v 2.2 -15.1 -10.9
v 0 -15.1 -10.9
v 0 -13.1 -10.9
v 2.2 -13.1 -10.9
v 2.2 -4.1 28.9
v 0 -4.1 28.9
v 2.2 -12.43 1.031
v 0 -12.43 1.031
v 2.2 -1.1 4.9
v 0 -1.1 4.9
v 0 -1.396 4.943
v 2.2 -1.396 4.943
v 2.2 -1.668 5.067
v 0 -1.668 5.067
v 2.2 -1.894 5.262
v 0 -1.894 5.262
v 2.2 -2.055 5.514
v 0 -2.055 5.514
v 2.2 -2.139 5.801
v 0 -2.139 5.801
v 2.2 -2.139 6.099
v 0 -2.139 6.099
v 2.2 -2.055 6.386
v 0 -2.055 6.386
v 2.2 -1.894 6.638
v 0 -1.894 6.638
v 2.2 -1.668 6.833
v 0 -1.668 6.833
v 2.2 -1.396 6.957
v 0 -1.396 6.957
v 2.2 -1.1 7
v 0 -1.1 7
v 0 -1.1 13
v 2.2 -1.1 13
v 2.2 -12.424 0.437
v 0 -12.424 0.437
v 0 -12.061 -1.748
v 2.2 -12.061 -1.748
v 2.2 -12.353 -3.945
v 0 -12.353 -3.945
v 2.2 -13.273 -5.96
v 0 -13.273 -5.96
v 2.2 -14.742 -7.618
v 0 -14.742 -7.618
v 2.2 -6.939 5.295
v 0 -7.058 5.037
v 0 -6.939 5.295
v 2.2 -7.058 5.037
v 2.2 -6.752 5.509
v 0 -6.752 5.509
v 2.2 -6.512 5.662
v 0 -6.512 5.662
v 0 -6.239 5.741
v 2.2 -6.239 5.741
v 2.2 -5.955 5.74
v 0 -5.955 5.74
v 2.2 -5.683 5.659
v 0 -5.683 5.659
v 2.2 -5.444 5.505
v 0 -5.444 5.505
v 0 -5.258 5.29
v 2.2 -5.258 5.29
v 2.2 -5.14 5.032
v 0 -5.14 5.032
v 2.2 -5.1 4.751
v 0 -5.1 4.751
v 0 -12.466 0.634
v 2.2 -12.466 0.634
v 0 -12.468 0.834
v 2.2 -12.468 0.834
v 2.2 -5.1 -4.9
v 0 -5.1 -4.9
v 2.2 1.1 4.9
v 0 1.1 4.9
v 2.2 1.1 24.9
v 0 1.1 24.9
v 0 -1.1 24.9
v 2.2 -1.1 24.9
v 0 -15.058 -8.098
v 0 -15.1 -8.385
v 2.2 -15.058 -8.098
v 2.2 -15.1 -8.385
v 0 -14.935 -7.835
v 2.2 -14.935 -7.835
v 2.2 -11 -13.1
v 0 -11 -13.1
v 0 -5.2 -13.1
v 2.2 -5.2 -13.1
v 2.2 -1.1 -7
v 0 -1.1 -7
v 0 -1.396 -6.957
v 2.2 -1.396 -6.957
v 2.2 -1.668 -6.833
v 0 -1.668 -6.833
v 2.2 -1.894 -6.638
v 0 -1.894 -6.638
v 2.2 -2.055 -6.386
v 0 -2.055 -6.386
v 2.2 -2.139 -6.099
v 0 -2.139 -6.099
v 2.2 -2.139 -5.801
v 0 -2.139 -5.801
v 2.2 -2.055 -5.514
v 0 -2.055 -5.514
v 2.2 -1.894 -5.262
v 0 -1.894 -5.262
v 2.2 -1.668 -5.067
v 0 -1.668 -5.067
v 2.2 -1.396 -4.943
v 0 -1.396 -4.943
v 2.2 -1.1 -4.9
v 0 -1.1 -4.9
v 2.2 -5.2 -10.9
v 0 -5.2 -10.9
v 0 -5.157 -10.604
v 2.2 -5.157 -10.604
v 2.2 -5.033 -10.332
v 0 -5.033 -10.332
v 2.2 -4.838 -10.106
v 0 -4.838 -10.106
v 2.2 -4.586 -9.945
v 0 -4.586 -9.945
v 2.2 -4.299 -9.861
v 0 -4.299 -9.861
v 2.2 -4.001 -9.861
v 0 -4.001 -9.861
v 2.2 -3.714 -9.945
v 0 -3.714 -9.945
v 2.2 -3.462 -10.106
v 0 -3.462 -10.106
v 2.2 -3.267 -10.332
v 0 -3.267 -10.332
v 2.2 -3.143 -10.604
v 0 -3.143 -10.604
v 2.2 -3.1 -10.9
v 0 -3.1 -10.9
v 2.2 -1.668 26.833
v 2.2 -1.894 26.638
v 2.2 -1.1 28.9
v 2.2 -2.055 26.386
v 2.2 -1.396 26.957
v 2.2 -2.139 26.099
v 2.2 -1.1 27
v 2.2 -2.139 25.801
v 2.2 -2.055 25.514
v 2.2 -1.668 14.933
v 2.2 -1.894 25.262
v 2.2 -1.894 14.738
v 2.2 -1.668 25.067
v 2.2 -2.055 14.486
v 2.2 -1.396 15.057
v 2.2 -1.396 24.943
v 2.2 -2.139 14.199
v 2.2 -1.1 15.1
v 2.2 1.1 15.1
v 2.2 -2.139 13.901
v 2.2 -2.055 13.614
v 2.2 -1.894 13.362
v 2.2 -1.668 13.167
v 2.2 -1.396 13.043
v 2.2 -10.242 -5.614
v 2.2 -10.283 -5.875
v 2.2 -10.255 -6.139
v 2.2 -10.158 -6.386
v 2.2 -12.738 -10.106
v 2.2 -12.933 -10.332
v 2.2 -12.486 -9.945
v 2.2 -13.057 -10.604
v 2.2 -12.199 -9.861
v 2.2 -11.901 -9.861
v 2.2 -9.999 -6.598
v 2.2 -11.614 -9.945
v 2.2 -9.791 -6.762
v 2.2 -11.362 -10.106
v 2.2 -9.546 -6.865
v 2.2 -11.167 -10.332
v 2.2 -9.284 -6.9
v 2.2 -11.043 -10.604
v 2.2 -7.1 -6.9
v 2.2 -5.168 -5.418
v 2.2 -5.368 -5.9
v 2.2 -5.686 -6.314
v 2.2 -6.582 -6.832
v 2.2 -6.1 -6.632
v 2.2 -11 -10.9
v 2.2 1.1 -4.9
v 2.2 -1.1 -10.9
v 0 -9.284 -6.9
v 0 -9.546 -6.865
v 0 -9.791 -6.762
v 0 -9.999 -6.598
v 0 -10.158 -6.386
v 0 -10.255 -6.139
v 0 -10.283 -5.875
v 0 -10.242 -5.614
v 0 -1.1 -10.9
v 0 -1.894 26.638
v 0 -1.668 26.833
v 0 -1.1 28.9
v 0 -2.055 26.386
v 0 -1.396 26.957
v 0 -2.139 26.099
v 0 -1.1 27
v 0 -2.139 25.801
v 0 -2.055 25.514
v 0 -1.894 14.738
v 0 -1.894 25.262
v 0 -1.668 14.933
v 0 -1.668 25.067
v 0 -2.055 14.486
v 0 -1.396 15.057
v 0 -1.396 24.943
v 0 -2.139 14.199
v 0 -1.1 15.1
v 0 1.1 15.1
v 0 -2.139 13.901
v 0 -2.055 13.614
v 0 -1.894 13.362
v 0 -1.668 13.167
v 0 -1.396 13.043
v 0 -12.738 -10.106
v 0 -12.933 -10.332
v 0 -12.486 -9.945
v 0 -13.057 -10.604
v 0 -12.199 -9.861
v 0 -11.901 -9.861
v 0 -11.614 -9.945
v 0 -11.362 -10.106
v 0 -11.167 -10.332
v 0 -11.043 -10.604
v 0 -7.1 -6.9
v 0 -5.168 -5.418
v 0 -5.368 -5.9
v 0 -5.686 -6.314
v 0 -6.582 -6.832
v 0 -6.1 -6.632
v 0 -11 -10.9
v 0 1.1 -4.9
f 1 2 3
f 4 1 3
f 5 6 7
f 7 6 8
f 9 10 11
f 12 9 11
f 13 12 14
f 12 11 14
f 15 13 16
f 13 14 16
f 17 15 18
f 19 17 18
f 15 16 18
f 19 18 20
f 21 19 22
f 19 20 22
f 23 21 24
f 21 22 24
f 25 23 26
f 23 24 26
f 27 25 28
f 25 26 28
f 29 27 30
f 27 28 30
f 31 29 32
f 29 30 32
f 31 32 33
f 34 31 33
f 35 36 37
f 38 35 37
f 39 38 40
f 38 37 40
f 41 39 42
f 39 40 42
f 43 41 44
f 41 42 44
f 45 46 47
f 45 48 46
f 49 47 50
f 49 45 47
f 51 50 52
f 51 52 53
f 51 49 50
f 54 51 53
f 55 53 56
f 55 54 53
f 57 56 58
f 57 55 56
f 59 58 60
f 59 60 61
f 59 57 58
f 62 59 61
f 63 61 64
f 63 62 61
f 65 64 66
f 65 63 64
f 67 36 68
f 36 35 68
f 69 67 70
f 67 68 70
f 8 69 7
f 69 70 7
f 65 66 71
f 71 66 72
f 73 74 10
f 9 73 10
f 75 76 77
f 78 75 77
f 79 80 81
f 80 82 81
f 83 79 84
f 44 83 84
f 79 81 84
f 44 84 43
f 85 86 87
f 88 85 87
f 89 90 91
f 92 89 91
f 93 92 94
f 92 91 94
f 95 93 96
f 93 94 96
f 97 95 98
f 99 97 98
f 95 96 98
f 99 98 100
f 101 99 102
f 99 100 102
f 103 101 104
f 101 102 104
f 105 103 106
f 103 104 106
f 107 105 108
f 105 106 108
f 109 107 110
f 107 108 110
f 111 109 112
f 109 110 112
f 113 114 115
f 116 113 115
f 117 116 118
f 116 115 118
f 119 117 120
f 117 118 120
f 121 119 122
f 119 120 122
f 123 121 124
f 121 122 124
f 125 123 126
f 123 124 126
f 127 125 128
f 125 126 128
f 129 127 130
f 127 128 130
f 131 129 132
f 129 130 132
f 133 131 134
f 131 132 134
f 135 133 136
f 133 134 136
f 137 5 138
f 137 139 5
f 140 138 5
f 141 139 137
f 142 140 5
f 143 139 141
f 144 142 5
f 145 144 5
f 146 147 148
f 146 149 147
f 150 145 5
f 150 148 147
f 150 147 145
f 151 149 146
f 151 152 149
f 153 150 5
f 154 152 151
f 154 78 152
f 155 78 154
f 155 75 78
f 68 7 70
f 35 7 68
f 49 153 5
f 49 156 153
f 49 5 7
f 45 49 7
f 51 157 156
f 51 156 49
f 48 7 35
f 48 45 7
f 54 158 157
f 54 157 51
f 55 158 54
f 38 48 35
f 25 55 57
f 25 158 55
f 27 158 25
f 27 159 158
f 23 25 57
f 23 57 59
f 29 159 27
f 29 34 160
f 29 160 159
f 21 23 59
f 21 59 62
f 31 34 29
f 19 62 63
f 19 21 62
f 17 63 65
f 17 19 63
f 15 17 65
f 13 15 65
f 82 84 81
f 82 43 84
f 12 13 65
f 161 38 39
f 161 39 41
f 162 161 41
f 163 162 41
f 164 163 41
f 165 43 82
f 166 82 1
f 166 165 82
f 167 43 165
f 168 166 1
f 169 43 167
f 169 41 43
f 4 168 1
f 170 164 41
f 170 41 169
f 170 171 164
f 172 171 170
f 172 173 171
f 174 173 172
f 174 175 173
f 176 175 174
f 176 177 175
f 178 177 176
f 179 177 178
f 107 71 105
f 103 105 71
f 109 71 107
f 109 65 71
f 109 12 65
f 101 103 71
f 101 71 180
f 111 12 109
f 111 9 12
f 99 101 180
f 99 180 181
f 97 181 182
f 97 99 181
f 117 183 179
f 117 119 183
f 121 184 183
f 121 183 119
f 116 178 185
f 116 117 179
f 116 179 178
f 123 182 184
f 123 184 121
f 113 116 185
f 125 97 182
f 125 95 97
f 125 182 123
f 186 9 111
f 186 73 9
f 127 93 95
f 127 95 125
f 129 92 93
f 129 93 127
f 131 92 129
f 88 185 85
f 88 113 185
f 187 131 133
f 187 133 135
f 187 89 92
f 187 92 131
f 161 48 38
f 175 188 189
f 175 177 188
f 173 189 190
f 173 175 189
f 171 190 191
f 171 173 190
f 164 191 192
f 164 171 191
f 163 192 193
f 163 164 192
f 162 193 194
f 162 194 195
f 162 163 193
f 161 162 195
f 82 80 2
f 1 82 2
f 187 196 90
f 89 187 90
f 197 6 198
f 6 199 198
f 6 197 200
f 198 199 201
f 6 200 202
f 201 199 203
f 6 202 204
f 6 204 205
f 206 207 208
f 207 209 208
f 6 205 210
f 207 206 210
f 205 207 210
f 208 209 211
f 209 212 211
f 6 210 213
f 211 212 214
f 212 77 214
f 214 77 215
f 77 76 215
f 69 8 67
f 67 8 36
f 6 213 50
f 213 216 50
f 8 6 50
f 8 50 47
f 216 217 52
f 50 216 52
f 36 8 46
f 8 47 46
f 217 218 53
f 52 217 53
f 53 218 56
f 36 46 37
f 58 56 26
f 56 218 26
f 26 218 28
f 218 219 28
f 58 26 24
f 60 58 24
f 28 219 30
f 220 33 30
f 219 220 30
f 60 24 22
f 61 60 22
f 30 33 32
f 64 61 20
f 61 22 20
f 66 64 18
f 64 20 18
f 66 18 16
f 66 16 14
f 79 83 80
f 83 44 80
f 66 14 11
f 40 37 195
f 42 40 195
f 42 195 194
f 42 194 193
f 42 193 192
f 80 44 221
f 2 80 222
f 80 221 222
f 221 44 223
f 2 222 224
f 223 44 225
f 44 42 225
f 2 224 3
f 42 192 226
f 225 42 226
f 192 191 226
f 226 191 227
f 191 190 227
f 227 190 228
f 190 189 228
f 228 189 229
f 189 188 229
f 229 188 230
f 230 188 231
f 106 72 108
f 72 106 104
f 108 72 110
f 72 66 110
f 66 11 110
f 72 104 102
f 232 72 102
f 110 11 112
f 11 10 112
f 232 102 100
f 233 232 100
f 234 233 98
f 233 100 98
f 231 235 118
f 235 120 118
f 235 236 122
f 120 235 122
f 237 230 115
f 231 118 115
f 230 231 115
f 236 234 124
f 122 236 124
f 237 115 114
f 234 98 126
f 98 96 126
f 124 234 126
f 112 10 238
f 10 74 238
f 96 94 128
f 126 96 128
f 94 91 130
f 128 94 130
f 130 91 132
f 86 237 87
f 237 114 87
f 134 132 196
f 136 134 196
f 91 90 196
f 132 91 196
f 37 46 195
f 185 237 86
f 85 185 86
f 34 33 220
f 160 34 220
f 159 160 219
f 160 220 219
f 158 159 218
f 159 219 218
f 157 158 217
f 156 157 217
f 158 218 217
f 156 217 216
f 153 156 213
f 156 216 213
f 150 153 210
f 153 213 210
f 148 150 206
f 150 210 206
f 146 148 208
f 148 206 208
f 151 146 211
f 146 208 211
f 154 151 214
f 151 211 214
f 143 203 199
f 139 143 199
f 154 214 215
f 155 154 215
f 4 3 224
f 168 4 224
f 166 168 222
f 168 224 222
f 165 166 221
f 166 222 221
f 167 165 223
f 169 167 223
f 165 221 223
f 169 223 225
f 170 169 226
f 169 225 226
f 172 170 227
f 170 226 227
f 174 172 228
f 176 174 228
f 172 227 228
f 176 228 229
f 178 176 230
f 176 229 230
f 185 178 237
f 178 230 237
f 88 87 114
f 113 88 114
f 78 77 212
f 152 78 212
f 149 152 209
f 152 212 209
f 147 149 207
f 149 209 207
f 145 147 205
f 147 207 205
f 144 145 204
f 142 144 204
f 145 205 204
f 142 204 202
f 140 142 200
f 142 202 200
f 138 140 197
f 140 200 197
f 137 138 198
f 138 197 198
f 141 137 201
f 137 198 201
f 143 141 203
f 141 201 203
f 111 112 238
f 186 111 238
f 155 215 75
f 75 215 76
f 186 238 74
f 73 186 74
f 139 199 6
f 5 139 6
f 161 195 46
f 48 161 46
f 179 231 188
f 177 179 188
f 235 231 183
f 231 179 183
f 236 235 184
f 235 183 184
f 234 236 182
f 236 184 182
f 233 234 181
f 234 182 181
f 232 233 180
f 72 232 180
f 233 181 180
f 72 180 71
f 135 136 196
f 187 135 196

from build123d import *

# Parameters (mm, degrees)
EXTRUDE_1_DEPTH = 2.2
FILLET_1_R      = 2
FILLET_2_R      = 1


with BuildPart() as part:
    # 草图1 → 凸台-拉伸1 (new body)
    with BuildSketch(Plane(origin=(0, 0, 0), x_dir=(0, 0, -1), z_dir=(1, 0, 0))):
        with BuildLine():
            ThreePointArc((7, -1.1), (5.95, -2.15), (4.9, -1.1))
            Line((4.9, -1.1), (4.9, 1.1))
            Line((4.9, 1.1), (-4.9, 1.1))
            Line((-4.9, 1.1), (-4.9, -1.1))
            ThreePointArc((-4.9, -1.1), (-5.95, -2.15), (-7, -1.1))
            Line((-7, -1.1), (-13, -1.1))
            ThreePointArc((-13, -1.1), (-14.05, -2.15), (-15.1, -1.1))
            Line((-15.1, -1.1), (-15.1, 1.1))
            Line((-15.1, 1.1), (-24.9, 1.1))
            Line((-24.9, 1.1), (-24.9, -1.1))
            ThreePointArc((-24.9, -1.1), (-25.95, -2.15), (-27, -1.1))
            Line((-27, -1.1), (-28.9, -1.1))
            Line((-28.9, -1.1), (-28.9, -4.1))
            Line((-28.9, -4.1), (-0.723011959, -12.522469251))
            ThreePointArc((-0.723011959, -12.522469251), (4.018082479, -12.374065966), (7.9, -15.1))
            Line((7.9, -15.1), (10.9, -15.1))
            Line((10.9, -15.1), (10.9, -13.1))
            ThreePointArc((10.9, -13.1), (9.85, -12.05), (10.9, -11))
            Line((10.9, -11), (13.1, -11))
            Line((13.1, -11), (13.1, -5.2))
            Line((13.1, -5.2), (10.9, -5.2))
            ThreePointArc((10.9, -5.2), (9.85, -4.15), (10.9, -3.1))
            Line((10.9, -3.1), (10.9, -1.1))
            Line((10.9, -1.1), (7, -1.1))
        make_face()
        Polygon((6.9, -10.626211615), (-11.587689765, -5.1), (6.9, -5.1), align=None, mode=Mode.SUBTRACT)
    extrude(amount=EXTRUDE_1_DEPTH)

    # 圆角1
    fillet_1_edges = [part.edges().sort_by_distance(p)[0] for p in [
        (1.1, -5.1, -6.9),
    ]]
    fillet(fillet_1_edges, radius=FILLET_1_R)

    # 圆角2
    fillet_2_edges = [part.edges().sort_by_distance(p)[0] for p in [
        (1.1, -5.1, 11.587689765),
        (1.1, -10.626211615, -6.9),
        (1.1, -12.522469251, 0.723011959),
        (1.1, -15.1, -7.9),
    ]]
    fillet(fillet_2_edges, radius=FILLET_2_R)


solid = part.part
